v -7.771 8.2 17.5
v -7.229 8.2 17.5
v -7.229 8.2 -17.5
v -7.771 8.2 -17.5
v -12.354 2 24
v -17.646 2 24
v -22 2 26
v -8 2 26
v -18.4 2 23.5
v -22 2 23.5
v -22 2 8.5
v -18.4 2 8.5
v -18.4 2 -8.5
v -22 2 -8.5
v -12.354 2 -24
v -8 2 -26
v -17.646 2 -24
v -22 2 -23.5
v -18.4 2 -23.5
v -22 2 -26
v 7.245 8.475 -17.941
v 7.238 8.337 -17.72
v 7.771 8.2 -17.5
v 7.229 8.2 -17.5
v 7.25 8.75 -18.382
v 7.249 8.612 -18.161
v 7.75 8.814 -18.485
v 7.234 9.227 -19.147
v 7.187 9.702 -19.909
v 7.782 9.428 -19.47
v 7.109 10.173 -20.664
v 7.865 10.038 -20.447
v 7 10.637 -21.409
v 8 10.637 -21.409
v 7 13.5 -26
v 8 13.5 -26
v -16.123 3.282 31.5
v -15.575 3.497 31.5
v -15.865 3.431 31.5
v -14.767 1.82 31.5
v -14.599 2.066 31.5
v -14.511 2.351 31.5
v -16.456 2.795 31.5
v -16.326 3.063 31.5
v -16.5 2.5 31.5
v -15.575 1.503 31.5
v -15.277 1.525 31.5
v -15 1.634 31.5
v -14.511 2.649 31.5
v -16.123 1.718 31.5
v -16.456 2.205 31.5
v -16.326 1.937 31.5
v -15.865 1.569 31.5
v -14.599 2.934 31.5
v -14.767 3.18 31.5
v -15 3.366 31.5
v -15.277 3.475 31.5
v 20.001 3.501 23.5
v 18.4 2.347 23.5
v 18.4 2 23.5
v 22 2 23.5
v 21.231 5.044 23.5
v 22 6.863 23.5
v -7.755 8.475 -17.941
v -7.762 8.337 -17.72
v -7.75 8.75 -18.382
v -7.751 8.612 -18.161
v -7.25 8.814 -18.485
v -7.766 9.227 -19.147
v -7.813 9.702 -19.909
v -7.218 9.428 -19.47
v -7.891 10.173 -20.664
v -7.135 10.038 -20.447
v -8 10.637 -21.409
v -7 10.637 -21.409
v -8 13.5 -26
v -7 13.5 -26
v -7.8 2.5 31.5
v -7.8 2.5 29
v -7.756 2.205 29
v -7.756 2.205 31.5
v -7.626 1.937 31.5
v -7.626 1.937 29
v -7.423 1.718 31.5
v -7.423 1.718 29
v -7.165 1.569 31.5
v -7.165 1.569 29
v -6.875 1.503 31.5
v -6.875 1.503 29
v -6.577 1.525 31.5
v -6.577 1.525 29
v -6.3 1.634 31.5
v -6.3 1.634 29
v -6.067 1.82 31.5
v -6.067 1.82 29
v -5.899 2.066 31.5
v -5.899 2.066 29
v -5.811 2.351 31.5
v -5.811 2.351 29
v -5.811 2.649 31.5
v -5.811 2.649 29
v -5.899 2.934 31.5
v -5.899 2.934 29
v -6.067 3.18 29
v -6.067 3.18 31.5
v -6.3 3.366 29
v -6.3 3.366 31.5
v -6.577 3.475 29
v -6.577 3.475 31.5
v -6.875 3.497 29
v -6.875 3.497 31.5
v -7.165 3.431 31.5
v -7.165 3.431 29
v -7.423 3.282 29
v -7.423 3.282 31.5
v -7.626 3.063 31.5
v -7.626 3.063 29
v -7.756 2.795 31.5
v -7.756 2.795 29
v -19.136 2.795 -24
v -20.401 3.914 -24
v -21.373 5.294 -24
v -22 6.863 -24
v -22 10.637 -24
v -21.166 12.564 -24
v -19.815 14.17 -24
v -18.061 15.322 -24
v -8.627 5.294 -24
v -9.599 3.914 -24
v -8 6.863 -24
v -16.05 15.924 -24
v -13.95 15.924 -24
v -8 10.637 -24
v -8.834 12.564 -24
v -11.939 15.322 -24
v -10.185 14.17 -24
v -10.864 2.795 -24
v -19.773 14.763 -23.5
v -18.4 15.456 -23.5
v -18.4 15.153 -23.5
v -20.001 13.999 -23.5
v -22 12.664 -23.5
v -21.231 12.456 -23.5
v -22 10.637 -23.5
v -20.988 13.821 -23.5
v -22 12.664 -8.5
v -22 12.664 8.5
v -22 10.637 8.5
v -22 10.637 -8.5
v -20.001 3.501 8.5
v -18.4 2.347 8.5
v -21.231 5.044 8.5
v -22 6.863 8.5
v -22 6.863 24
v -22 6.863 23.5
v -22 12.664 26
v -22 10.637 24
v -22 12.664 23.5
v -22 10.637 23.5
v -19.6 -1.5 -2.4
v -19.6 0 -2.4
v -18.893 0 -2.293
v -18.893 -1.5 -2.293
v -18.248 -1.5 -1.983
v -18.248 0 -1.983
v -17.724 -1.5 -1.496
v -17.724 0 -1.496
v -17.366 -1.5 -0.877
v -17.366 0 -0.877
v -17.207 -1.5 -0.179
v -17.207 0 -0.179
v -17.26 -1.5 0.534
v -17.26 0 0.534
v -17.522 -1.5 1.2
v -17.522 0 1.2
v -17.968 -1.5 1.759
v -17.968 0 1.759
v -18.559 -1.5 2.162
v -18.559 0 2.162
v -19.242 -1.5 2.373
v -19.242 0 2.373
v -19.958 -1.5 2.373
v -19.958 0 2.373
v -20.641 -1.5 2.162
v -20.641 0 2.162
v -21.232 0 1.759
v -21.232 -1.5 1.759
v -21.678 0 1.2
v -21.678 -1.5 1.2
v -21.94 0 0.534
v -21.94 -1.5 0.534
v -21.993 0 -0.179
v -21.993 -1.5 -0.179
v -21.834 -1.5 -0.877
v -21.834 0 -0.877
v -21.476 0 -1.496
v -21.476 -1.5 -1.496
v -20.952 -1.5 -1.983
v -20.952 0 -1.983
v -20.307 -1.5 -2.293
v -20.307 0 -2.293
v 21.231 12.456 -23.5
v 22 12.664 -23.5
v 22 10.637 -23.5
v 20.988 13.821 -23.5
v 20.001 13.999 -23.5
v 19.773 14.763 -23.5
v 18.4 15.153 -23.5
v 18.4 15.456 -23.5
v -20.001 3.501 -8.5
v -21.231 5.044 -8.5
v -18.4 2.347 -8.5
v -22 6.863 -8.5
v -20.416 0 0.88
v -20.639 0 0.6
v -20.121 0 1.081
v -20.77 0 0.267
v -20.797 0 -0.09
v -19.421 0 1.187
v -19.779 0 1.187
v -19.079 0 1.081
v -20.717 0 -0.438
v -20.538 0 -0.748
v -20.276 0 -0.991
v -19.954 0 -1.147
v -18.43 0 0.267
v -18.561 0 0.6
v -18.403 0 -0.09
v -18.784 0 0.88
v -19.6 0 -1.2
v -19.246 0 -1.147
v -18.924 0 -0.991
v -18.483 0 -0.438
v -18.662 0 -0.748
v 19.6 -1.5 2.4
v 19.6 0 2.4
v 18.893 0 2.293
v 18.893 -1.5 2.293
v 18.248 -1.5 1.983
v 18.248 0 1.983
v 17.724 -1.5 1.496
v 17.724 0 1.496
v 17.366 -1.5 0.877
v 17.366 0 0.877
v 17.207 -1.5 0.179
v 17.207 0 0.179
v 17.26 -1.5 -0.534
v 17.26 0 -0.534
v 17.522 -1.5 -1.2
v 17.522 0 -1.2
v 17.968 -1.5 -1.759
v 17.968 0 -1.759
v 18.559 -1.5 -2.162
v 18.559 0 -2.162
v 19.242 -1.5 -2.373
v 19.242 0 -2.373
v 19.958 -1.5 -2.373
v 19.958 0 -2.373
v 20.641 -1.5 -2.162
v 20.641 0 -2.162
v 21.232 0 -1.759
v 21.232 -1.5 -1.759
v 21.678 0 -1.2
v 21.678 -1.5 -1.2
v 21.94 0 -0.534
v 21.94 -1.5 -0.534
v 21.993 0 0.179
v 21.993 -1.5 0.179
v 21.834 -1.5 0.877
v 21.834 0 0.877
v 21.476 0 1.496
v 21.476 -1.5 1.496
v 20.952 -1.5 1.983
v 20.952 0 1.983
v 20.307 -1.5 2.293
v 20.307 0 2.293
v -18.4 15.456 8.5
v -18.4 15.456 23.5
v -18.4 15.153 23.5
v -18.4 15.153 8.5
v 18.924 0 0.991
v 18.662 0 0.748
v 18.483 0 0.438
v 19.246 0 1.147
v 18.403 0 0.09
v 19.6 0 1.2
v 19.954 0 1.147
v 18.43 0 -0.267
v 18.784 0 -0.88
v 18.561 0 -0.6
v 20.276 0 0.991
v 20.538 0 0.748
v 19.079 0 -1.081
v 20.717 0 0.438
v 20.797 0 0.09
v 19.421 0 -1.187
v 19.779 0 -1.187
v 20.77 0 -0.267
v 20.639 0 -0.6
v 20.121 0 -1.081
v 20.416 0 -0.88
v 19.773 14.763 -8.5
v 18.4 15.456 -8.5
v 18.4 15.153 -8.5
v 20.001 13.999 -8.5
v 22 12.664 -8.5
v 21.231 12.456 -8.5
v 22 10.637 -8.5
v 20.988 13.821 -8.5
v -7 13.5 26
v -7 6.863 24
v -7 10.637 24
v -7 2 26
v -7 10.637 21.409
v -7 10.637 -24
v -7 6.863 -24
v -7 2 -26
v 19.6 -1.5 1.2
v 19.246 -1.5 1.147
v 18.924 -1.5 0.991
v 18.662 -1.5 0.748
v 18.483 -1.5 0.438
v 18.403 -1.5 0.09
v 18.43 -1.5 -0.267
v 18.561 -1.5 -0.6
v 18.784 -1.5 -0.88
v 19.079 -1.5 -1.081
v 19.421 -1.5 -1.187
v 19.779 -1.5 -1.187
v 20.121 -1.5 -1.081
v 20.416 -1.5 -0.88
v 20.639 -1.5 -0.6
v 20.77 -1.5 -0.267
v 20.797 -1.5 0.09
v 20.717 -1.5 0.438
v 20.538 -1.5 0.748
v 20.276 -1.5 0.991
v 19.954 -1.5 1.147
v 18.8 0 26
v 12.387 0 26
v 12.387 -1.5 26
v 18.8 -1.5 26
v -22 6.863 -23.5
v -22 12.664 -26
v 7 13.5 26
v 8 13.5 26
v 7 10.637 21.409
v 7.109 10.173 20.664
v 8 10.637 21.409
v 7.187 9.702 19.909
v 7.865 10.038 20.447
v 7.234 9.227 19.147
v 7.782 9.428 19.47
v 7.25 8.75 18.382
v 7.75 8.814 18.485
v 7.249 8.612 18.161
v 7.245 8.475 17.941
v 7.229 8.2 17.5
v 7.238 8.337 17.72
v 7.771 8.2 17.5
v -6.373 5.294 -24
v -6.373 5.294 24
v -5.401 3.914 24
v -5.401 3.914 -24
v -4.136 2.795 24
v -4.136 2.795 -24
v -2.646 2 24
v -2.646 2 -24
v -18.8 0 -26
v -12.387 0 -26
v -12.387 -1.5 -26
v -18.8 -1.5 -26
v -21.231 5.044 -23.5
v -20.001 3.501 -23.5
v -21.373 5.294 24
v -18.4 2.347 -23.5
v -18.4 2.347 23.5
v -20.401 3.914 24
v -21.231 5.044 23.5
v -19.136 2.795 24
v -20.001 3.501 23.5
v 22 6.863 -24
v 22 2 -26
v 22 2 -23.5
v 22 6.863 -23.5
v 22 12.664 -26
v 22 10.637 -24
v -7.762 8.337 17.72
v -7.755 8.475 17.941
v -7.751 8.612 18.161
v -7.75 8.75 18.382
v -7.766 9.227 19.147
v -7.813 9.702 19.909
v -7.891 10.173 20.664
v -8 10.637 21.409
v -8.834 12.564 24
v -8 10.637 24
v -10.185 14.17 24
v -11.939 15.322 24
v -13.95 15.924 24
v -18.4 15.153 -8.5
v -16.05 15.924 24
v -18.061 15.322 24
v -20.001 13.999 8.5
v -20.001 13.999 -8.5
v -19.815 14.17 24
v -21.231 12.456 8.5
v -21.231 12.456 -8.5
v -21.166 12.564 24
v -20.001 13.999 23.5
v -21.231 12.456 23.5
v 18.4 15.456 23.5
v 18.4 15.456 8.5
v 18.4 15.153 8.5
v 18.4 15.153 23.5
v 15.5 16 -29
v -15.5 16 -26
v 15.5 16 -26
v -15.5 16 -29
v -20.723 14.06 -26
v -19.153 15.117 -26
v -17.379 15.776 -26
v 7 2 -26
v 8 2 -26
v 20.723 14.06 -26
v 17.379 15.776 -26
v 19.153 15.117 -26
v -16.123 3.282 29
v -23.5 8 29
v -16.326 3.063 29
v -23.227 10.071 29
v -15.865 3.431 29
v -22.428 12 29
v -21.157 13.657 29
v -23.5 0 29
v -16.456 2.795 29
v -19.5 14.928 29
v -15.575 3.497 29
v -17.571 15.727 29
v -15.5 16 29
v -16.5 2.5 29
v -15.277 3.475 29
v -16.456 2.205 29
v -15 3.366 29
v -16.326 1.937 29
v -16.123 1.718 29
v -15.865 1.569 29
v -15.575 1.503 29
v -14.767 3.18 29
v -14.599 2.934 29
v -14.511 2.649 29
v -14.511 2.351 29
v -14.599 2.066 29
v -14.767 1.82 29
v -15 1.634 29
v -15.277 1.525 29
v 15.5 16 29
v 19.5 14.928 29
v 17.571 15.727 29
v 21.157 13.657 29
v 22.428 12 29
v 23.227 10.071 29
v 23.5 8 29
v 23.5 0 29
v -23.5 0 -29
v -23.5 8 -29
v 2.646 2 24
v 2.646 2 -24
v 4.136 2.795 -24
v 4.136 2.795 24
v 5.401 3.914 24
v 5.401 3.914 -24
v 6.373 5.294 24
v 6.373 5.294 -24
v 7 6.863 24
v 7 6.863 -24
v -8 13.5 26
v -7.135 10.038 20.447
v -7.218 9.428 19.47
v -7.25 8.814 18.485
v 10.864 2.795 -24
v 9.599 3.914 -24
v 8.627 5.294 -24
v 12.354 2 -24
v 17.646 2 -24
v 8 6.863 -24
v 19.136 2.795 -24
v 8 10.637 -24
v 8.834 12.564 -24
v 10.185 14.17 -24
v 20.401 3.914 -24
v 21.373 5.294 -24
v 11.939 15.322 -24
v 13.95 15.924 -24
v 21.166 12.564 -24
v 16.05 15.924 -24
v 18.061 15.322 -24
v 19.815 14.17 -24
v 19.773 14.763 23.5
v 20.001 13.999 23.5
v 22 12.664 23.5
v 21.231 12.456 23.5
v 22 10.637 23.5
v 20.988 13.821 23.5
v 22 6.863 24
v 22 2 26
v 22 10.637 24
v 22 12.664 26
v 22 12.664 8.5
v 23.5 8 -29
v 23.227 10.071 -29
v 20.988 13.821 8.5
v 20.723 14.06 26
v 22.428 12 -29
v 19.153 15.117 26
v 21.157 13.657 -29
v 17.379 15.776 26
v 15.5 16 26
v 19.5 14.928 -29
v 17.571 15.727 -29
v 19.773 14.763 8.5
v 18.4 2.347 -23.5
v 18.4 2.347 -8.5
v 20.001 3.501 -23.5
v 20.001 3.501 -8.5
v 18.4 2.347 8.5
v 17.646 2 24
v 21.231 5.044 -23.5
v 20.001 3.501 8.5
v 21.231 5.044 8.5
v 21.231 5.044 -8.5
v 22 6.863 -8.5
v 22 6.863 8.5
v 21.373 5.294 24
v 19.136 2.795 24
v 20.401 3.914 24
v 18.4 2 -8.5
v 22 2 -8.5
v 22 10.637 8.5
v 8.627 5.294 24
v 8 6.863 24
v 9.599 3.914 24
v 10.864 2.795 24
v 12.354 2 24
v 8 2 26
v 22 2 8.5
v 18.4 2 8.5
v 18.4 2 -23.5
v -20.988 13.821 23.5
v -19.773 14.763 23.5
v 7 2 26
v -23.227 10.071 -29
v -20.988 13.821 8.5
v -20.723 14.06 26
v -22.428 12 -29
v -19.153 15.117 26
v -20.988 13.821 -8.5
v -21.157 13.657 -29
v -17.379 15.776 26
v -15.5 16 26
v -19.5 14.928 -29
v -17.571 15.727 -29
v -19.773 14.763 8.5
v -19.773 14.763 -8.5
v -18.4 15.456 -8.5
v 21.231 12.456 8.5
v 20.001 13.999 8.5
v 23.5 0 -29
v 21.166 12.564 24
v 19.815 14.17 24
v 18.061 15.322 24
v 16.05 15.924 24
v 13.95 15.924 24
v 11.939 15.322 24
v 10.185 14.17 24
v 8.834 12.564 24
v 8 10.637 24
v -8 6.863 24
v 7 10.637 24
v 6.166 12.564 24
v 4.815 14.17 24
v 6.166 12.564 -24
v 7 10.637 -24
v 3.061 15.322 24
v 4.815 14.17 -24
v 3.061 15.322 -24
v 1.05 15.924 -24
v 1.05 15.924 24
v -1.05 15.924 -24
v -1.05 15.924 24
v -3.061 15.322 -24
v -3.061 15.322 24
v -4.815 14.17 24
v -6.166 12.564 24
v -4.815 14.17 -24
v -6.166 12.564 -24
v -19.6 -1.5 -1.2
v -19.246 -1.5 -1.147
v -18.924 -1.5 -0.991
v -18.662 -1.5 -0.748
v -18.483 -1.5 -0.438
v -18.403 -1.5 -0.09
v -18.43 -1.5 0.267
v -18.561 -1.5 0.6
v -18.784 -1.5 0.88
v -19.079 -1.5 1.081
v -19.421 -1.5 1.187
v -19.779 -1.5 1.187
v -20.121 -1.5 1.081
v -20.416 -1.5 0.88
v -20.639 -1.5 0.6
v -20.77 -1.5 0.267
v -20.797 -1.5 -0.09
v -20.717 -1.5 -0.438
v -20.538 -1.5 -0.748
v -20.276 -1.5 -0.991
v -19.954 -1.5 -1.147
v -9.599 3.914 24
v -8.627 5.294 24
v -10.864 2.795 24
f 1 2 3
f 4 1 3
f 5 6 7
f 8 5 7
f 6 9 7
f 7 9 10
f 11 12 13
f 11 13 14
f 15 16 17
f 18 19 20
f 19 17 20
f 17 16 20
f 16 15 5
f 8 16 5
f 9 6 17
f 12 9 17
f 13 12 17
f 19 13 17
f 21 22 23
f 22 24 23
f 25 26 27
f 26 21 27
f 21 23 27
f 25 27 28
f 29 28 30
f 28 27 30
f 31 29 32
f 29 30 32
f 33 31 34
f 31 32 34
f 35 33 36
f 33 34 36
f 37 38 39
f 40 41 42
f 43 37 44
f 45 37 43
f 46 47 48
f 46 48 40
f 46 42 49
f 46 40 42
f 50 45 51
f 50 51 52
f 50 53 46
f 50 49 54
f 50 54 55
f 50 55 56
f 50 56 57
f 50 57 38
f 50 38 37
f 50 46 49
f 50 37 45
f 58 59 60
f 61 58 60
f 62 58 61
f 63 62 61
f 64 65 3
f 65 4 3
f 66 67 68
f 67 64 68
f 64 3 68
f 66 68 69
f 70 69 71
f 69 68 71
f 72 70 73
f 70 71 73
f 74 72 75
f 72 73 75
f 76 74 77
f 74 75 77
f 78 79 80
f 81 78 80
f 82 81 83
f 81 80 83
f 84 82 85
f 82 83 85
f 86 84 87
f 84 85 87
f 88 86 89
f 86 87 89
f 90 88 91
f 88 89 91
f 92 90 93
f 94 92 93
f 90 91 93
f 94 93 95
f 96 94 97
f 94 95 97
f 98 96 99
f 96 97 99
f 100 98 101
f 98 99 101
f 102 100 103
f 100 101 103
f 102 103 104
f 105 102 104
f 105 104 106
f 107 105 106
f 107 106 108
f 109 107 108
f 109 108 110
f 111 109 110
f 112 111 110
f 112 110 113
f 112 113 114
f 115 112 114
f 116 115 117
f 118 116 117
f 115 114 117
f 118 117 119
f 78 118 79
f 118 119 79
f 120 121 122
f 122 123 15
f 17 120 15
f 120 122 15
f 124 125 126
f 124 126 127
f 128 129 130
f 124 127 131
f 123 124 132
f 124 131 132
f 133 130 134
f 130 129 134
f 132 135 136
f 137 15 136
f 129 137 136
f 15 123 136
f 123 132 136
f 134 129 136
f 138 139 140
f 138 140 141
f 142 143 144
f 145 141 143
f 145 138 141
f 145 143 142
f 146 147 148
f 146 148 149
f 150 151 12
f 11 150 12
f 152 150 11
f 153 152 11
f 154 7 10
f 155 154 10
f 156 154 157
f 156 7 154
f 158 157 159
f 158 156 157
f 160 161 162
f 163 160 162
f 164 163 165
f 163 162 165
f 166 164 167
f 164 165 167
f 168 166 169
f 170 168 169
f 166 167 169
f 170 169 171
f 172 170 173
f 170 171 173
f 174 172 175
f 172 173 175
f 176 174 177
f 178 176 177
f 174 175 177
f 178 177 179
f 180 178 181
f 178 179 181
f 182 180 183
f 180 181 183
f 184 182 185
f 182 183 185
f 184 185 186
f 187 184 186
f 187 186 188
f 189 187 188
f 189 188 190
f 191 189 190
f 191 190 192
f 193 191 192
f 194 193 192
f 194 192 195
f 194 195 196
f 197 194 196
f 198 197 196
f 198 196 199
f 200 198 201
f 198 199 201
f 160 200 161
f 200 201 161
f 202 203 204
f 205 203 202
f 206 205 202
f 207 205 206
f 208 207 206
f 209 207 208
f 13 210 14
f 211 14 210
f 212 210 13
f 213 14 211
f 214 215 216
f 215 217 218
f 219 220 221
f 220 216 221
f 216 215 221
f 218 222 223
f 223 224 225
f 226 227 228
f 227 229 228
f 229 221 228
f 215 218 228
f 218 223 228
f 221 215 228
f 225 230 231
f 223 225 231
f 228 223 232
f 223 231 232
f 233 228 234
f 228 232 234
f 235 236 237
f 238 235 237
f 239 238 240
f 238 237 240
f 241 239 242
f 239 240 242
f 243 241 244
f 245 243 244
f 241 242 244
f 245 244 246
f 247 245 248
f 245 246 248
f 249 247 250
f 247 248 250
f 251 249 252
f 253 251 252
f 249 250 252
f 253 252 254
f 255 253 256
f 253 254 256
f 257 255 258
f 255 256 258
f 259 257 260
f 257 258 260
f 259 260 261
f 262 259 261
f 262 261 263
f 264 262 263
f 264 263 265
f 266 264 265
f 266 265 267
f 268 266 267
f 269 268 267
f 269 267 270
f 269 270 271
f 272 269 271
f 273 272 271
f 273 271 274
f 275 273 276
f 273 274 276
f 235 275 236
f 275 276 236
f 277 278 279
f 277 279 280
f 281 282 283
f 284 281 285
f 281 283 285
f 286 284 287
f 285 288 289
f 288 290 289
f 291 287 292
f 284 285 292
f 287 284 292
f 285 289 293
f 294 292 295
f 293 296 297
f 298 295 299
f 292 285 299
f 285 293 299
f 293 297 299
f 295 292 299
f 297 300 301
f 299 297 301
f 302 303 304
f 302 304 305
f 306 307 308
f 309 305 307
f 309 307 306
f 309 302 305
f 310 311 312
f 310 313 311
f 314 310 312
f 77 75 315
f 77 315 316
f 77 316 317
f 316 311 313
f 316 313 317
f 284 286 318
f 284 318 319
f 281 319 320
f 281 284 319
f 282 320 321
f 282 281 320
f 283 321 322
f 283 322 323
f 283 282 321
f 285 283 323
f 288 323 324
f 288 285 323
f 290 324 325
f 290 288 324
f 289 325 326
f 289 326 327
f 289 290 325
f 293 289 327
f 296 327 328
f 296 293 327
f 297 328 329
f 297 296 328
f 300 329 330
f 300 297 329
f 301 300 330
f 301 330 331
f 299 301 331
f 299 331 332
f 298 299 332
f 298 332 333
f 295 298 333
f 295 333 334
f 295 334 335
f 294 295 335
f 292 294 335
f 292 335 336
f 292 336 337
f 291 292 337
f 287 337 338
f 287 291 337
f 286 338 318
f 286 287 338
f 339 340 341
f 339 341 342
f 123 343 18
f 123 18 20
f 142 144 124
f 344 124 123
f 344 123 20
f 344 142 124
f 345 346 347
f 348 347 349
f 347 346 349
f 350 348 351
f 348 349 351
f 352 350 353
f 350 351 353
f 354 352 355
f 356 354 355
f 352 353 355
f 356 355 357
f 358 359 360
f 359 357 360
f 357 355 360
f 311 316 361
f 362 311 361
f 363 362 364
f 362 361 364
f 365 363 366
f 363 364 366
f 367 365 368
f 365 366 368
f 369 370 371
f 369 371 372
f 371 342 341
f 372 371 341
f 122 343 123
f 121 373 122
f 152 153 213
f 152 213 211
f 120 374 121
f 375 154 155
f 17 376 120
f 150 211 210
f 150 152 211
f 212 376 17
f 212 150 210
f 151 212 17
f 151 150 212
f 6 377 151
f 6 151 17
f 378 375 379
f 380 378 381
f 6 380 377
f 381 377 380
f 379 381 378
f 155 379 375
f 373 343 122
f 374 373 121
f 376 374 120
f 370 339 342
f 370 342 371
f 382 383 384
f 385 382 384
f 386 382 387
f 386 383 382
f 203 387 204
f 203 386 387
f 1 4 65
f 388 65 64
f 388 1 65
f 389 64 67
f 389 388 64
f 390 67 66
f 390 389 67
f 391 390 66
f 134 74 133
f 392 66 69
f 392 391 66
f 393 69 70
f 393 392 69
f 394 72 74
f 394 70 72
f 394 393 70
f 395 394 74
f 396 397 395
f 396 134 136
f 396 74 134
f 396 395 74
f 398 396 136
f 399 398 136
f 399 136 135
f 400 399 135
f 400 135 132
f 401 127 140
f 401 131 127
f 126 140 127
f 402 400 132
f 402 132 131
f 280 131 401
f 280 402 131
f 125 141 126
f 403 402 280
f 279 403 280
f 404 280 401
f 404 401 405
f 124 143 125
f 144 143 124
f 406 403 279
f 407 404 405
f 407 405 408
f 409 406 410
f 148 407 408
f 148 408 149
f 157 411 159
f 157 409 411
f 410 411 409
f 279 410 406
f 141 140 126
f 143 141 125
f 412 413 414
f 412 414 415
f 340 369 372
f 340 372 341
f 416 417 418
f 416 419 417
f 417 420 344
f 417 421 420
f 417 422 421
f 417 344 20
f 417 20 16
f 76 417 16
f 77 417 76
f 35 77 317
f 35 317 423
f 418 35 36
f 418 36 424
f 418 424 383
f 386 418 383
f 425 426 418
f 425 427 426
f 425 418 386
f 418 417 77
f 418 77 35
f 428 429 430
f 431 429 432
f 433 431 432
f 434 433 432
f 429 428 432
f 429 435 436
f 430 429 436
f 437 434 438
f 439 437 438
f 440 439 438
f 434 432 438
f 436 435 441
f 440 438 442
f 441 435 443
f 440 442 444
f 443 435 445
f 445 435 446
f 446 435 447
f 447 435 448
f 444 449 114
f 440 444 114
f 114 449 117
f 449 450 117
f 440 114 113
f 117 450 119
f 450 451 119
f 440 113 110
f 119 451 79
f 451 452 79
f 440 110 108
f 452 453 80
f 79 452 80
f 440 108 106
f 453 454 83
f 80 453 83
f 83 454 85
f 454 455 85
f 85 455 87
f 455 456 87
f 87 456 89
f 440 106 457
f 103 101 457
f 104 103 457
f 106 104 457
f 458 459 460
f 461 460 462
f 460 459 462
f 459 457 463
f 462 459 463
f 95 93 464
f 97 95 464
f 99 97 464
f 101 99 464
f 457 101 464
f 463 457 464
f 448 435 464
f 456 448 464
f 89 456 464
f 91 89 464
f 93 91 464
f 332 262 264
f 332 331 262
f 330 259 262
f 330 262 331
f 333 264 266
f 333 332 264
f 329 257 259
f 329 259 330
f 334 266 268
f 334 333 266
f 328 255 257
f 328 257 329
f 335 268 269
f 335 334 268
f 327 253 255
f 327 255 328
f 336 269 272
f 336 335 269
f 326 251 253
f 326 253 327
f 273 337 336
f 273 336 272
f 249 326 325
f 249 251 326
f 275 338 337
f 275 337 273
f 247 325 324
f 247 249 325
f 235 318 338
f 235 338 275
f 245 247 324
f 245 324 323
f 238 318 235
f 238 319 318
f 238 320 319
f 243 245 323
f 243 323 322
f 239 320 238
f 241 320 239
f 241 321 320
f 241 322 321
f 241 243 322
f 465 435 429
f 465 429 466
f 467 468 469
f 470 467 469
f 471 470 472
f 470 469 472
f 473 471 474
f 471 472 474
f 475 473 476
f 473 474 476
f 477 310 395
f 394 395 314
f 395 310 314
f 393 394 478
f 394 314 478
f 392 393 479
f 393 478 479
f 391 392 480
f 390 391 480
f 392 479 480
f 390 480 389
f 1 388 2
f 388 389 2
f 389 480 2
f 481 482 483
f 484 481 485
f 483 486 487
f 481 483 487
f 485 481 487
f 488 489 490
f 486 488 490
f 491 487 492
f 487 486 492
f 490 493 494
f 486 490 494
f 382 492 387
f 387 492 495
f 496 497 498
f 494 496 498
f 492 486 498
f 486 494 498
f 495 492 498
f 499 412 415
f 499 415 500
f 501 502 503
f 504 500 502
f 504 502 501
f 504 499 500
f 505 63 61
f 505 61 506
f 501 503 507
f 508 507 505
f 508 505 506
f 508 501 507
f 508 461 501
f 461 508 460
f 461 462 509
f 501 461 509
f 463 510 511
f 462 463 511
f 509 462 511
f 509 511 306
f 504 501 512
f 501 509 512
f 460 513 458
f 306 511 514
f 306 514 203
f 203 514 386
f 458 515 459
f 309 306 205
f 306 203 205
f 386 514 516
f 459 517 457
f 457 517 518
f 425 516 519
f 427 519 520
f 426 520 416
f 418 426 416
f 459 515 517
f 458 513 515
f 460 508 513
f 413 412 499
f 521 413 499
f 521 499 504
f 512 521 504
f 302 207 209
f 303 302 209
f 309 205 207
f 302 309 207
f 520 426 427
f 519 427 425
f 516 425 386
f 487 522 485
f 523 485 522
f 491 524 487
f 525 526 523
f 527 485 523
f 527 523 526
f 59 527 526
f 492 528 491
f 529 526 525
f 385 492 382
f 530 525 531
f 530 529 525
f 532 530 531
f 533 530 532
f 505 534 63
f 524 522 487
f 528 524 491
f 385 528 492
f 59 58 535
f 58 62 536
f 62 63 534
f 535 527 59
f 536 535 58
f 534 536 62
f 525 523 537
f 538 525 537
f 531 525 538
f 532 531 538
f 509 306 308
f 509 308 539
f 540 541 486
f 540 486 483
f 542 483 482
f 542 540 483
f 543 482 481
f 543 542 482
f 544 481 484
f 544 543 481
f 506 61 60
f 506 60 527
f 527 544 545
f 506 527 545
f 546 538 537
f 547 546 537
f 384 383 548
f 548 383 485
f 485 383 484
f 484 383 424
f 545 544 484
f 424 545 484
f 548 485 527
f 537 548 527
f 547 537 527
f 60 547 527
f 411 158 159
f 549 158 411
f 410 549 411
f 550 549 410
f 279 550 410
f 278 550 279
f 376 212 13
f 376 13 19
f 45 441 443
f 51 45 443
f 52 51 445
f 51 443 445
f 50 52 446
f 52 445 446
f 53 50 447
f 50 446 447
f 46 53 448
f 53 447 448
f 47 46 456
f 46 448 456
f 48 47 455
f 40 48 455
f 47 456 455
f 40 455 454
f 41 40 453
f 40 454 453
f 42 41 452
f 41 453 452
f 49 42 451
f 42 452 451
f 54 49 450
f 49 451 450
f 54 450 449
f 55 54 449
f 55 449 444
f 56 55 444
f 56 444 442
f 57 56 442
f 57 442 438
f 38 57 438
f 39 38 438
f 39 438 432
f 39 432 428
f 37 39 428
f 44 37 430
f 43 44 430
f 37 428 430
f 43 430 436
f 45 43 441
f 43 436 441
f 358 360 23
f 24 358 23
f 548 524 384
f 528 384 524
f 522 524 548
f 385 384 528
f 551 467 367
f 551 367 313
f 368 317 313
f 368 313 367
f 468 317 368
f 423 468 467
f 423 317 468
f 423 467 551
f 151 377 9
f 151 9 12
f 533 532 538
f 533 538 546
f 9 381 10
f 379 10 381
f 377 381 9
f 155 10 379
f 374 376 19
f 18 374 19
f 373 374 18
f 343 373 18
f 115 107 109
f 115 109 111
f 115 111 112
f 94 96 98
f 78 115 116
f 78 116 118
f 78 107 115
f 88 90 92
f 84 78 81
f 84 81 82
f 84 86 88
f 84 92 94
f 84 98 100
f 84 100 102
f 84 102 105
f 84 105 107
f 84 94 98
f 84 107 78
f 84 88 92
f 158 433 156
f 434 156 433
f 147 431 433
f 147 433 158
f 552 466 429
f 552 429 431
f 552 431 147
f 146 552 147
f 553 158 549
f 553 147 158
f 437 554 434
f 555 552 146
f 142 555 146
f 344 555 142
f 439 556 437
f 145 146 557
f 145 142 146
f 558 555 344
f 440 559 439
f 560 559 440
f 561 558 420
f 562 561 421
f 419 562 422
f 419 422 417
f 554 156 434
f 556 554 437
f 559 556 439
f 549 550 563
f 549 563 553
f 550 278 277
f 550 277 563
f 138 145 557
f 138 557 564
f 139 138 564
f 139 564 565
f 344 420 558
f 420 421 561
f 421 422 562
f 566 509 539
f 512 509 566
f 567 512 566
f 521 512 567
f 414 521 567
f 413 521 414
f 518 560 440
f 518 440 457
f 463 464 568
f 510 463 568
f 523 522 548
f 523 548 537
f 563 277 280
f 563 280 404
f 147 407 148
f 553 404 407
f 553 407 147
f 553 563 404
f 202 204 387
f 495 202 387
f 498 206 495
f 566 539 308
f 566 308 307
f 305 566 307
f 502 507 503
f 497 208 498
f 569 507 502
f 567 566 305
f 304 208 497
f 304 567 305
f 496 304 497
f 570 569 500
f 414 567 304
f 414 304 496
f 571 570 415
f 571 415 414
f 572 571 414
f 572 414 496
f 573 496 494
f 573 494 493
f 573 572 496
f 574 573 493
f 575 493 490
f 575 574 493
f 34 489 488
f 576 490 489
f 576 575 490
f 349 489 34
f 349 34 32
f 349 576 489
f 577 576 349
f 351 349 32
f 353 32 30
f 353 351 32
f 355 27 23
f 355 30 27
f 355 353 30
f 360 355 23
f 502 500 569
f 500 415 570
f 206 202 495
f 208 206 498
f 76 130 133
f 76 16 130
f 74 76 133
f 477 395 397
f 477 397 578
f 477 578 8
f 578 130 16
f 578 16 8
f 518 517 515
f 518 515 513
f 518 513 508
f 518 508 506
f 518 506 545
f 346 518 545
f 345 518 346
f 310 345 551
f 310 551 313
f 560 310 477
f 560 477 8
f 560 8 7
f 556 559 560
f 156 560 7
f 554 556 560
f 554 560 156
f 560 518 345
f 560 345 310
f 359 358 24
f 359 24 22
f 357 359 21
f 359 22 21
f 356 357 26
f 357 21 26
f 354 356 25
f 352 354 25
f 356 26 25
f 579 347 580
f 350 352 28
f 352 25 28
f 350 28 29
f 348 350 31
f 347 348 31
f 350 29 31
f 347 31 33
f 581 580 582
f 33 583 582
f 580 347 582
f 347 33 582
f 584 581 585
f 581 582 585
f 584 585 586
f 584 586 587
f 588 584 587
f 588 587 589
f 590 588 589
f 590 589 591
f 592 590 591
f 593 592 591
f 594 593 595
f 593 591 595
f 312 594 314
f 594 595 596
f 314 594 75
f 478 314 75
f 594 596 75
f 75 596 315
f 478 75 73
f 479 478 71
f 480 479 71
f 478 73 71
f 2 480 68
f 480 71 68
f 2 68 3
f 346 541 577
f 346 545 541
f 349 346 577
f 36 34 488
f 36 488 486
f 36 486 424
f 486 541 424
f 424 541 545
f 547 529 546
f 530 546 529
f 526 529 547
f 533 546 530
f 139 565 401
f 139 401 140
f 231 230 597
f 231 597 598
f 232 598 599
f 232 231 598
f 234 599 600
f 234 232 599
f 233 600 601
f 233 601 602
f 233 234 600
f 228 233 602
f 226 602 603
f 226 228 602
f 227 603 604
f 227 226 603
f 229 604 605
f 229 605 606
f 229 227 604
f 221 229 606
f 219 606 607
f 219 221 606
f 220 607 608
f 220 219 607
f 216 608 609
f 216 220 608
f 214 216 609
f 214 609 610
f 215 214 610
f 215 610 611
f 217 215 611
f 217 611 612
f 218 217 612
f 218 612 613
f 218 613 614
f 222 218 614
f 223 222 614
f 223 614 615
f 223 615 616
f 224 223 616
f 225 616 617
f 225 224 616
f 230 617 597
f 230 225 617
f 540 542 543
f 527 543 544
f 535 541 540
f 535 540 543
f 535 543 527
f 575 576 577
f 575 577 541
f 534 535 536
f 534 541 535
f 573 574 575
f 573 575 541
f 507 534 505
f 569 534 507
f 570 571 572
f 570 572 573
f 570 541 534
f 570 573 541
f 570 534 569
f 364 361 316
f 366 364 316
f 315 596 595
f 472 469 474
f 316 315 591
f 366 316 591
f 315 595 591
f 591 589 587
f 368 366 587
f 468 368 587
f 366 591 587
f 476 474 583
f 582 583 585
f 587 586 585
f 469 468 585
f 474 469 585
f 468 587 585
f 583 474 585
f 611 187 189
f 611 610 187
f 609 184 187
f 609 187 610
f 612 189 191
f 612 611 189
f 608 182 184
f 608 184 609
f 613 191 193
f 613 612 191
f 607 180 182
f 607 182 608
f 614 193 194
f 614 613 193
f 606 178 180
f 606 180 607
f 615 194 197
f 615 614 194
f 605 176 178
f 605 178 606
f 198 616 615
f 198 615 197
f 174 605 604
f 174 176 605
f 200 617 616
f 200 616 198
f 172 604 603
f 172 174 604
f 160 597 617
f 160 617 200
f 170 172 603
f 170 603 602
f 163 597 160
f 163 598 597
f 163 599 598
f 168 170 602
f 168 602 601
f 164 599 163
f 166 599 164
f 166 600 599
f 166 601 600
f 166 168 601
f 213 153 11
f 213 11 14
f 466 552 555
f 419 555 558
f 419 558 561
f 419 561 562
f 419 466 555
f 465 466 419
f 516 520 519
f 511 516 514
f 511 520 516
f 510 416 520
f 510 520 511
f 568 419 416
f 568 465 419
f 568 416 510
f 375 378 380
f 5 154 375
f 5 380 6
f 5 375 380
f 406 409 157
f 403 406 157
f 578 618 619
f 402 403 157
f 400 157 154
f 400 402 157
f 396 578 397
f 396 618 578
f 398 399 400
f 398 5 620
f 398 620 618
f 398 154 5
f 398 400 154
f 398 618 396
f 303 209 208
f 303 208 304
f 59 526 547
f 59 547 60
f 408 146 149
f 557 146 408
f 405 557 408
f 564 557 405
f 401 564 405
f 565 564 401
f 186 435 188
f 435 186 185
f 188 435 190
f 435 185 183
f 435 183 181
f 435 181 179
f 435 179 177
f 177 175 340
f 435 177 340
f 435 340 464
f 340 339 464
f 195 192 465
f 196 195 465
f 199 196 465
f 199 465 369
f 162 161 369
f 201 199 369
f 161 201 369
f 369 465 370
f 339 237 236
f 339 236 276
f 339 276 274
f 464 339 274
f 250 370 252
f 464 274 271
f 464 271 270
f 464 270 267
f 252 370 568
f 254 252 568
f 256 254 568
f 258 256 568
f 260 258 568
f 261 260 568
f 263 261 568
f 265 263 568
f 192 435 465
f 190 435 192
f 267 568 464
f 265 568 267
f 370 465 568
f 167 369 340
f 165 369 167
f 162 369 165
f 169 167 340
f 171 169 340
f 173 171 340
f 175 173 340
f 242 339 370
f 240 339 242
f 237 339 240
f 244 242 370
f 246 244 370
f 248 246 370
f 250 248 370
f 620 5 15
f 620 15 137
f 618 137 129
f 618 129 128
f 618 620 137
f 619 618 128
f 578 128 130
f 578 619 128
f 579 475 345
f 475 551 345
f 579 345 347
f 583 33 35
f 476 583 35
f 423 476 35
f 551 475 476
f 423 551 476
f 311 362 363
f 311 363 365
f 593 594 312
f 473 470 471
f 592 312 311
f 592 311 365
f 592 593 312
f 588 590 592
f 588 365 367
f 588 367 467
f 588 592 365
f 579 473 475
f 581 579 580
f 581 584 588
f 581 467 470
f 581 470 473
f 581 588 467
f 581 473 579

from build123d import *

# Parameters (mm, degrees)
SKETCH1_W           = 47
SKETCH1_H           = 58
BOSS_EXTRUDE1_DEPTH = 16
FILLET1_R           = 8
SKETCH2_W           = 14
SKETCH2_H           = 52
CUT_EXTRUDE1_DEPTH  = 14
CUT_EXTRUDE2_REACH  = 47.708
SKETCH4_R           = 7.25
BOSS_EXTRUDE3_DEPTH = 24
SKETCH5_R           = 2.4
SKETCH5_R_2         = 1.2
BOSS_EXTRUDE4_DEPTH = 1.5
SKETCH6_R           = 1
BOSS_EXTRUDE5_DEPTH = 2.5


with BuildPart() as part:
    # Sketch1 → Boss-Extrude1 (new body)
    with BuildSketch(Plane(origin=(0, 0, 0), x_dir=(1, 0, 0), z_dir=(0, 1, 0))):
        Rectangle(SKETCH1_W, SKETCH1_H)
    extrude(amount=BOSS_EXTRUDE1_DEPTH)

    # Fillet1
    fillet1_edges = [part.edges().sort_by_distance(p)[0] for p in [
        (-23.5, 16, 0),
        (23.5, 16, 0),
    ]]
    fillet(fillet1_edges, radius=FILLET1_R)

    # Sketch2 → Cut-Extrude1 (cut)
    with BuildSketch(Plane(origin=(0, 16, 0), x_dir=(1, 0, 0), z_dir=(0, 1, 0))):
        Polygon((-22, 26), (-8, 26), (-8, -26), (-22, -26), (-22, -23.5), (-18.4, -23.5), (-18.4, -8.5), (-22, -8.5), (-22, 8.5), (-18.4, 8.5), (-18.4, 23.5), (-22, 23.5), align=None)
        Rectangle(SKETCH2_W, SKETCH2_H)
        Polygon((8, 26), (22, 26), (22, 23.5), (18.4, 23.5), (18.4, 8.5), (22, 8.5), (22, -8.5), (18.4, -8.5), (18.4, -23.5), (22, -23.5), (22, -26), (8, -26), align=None)
    extrude(amount=-CUT_EXTRUDE1_DEPTH, mode=Mode.SUBTRACT)

    # Cut-Extrude2: up to this face of the body (flat: up to its plane)
    cut_extrude2_end = Plane(part.part.faces().sort_by_distance((-8, 9, 0))[0])
    # Sketch3 → Cut-Extrude2 (cut, up to the picked face)
    with BuildSketch(Plane(origin=(8, 0, 0), x_dir=(0, 0, -1), z_dir=(1, 0, 0)), mode=Mode.PRIVATE) as cut_extrude2_sk1:
        Polygon((-26, 16), (-26, 13.5), (-17.5, 8.2), (17.5, 8.2), (26, 13.5), (26, 16), align=None)
    cut_extrude2_tool1 = split(extrude(cut_extrude2_sk1.sketch, amount=-CUT_EXTRUDE2_REACH, mode=Mode.PRIVATE), bisect_by=cut_extrude2_end, keep=Keep.BOTH, mode=Mode.PRIVATE)
    add(cut_extrude2_tool1.solids().sort_by(Axis((8, 12.366556, 0), (-1, 0, 0)))[0], mode=Mode.SUBTRACT)

    # Sketch4 → Boss-Extrude3 (add, symmetric)
    with BuildSketch(Plane.XY):
        with Locations((-15, 8.75)):
            Circle(SKETCH4_R)
        with Locations((0, 8.75)):
            Circle(SKETCH4_R)
        with Locations((15, 8.75)):
            Circle(SKETCH4_R)
    extrude(amount=BOSS_EXTRUDE3_DEPTH, both=True)

    # Sketch5 → Boss-Extrude4 (add)
    # profile 1 of 3: a face of its own
    with BuildSketch(Plane.XZ):
        with Locations(Location((-19.6, 0, 0), (0, 0, 270))):
            Circle(SKETCH5_R)
        with Locations(Location((-19.6, 0, 0), (0, 0, 270))):
            Circle(SKETCH5_R_2, mode=Mode.SUBTRACT)
    # profile 2 of 3: a face of its own
    with BuildSketch(Plane.XZ):
        with Locations(Location((19.6, 0, 0), (0, 0, 90))):
            Circle(SKETCH5_R)
        with Locations(Location((19.6, 0, 0), (0, 0, 90))):
            Circle(SKETCH5_R_2, mode=Mode.SUBTRACT)
    # profile 3 of 3: a face of its own
    with BuildSketch(Plane.XZ):
        Polygon((-18.8, -26), (12.386677769, 26), (18.8, 26), (-12.386677769, -26), align=None)
    extrude(amount=BOSS_EXTRUDE4_DEPTH)

    # Sketch6 → Boss-Extrude5 (add)
    with BuildSketch(Plane.XY.offset(29)):
        with Locations(Location((-15.5, 2.5, 0), (0, 0, 180))):
            Circle(SKETCH6_R)
        with Locations(Location((-6.8, 2.5, 0), (0, 0, 180))):
            Circle(SKETCH6_R)
    extrude(amount=BOSS_EXTRUDE5_DEPTH)


solid = part.part
